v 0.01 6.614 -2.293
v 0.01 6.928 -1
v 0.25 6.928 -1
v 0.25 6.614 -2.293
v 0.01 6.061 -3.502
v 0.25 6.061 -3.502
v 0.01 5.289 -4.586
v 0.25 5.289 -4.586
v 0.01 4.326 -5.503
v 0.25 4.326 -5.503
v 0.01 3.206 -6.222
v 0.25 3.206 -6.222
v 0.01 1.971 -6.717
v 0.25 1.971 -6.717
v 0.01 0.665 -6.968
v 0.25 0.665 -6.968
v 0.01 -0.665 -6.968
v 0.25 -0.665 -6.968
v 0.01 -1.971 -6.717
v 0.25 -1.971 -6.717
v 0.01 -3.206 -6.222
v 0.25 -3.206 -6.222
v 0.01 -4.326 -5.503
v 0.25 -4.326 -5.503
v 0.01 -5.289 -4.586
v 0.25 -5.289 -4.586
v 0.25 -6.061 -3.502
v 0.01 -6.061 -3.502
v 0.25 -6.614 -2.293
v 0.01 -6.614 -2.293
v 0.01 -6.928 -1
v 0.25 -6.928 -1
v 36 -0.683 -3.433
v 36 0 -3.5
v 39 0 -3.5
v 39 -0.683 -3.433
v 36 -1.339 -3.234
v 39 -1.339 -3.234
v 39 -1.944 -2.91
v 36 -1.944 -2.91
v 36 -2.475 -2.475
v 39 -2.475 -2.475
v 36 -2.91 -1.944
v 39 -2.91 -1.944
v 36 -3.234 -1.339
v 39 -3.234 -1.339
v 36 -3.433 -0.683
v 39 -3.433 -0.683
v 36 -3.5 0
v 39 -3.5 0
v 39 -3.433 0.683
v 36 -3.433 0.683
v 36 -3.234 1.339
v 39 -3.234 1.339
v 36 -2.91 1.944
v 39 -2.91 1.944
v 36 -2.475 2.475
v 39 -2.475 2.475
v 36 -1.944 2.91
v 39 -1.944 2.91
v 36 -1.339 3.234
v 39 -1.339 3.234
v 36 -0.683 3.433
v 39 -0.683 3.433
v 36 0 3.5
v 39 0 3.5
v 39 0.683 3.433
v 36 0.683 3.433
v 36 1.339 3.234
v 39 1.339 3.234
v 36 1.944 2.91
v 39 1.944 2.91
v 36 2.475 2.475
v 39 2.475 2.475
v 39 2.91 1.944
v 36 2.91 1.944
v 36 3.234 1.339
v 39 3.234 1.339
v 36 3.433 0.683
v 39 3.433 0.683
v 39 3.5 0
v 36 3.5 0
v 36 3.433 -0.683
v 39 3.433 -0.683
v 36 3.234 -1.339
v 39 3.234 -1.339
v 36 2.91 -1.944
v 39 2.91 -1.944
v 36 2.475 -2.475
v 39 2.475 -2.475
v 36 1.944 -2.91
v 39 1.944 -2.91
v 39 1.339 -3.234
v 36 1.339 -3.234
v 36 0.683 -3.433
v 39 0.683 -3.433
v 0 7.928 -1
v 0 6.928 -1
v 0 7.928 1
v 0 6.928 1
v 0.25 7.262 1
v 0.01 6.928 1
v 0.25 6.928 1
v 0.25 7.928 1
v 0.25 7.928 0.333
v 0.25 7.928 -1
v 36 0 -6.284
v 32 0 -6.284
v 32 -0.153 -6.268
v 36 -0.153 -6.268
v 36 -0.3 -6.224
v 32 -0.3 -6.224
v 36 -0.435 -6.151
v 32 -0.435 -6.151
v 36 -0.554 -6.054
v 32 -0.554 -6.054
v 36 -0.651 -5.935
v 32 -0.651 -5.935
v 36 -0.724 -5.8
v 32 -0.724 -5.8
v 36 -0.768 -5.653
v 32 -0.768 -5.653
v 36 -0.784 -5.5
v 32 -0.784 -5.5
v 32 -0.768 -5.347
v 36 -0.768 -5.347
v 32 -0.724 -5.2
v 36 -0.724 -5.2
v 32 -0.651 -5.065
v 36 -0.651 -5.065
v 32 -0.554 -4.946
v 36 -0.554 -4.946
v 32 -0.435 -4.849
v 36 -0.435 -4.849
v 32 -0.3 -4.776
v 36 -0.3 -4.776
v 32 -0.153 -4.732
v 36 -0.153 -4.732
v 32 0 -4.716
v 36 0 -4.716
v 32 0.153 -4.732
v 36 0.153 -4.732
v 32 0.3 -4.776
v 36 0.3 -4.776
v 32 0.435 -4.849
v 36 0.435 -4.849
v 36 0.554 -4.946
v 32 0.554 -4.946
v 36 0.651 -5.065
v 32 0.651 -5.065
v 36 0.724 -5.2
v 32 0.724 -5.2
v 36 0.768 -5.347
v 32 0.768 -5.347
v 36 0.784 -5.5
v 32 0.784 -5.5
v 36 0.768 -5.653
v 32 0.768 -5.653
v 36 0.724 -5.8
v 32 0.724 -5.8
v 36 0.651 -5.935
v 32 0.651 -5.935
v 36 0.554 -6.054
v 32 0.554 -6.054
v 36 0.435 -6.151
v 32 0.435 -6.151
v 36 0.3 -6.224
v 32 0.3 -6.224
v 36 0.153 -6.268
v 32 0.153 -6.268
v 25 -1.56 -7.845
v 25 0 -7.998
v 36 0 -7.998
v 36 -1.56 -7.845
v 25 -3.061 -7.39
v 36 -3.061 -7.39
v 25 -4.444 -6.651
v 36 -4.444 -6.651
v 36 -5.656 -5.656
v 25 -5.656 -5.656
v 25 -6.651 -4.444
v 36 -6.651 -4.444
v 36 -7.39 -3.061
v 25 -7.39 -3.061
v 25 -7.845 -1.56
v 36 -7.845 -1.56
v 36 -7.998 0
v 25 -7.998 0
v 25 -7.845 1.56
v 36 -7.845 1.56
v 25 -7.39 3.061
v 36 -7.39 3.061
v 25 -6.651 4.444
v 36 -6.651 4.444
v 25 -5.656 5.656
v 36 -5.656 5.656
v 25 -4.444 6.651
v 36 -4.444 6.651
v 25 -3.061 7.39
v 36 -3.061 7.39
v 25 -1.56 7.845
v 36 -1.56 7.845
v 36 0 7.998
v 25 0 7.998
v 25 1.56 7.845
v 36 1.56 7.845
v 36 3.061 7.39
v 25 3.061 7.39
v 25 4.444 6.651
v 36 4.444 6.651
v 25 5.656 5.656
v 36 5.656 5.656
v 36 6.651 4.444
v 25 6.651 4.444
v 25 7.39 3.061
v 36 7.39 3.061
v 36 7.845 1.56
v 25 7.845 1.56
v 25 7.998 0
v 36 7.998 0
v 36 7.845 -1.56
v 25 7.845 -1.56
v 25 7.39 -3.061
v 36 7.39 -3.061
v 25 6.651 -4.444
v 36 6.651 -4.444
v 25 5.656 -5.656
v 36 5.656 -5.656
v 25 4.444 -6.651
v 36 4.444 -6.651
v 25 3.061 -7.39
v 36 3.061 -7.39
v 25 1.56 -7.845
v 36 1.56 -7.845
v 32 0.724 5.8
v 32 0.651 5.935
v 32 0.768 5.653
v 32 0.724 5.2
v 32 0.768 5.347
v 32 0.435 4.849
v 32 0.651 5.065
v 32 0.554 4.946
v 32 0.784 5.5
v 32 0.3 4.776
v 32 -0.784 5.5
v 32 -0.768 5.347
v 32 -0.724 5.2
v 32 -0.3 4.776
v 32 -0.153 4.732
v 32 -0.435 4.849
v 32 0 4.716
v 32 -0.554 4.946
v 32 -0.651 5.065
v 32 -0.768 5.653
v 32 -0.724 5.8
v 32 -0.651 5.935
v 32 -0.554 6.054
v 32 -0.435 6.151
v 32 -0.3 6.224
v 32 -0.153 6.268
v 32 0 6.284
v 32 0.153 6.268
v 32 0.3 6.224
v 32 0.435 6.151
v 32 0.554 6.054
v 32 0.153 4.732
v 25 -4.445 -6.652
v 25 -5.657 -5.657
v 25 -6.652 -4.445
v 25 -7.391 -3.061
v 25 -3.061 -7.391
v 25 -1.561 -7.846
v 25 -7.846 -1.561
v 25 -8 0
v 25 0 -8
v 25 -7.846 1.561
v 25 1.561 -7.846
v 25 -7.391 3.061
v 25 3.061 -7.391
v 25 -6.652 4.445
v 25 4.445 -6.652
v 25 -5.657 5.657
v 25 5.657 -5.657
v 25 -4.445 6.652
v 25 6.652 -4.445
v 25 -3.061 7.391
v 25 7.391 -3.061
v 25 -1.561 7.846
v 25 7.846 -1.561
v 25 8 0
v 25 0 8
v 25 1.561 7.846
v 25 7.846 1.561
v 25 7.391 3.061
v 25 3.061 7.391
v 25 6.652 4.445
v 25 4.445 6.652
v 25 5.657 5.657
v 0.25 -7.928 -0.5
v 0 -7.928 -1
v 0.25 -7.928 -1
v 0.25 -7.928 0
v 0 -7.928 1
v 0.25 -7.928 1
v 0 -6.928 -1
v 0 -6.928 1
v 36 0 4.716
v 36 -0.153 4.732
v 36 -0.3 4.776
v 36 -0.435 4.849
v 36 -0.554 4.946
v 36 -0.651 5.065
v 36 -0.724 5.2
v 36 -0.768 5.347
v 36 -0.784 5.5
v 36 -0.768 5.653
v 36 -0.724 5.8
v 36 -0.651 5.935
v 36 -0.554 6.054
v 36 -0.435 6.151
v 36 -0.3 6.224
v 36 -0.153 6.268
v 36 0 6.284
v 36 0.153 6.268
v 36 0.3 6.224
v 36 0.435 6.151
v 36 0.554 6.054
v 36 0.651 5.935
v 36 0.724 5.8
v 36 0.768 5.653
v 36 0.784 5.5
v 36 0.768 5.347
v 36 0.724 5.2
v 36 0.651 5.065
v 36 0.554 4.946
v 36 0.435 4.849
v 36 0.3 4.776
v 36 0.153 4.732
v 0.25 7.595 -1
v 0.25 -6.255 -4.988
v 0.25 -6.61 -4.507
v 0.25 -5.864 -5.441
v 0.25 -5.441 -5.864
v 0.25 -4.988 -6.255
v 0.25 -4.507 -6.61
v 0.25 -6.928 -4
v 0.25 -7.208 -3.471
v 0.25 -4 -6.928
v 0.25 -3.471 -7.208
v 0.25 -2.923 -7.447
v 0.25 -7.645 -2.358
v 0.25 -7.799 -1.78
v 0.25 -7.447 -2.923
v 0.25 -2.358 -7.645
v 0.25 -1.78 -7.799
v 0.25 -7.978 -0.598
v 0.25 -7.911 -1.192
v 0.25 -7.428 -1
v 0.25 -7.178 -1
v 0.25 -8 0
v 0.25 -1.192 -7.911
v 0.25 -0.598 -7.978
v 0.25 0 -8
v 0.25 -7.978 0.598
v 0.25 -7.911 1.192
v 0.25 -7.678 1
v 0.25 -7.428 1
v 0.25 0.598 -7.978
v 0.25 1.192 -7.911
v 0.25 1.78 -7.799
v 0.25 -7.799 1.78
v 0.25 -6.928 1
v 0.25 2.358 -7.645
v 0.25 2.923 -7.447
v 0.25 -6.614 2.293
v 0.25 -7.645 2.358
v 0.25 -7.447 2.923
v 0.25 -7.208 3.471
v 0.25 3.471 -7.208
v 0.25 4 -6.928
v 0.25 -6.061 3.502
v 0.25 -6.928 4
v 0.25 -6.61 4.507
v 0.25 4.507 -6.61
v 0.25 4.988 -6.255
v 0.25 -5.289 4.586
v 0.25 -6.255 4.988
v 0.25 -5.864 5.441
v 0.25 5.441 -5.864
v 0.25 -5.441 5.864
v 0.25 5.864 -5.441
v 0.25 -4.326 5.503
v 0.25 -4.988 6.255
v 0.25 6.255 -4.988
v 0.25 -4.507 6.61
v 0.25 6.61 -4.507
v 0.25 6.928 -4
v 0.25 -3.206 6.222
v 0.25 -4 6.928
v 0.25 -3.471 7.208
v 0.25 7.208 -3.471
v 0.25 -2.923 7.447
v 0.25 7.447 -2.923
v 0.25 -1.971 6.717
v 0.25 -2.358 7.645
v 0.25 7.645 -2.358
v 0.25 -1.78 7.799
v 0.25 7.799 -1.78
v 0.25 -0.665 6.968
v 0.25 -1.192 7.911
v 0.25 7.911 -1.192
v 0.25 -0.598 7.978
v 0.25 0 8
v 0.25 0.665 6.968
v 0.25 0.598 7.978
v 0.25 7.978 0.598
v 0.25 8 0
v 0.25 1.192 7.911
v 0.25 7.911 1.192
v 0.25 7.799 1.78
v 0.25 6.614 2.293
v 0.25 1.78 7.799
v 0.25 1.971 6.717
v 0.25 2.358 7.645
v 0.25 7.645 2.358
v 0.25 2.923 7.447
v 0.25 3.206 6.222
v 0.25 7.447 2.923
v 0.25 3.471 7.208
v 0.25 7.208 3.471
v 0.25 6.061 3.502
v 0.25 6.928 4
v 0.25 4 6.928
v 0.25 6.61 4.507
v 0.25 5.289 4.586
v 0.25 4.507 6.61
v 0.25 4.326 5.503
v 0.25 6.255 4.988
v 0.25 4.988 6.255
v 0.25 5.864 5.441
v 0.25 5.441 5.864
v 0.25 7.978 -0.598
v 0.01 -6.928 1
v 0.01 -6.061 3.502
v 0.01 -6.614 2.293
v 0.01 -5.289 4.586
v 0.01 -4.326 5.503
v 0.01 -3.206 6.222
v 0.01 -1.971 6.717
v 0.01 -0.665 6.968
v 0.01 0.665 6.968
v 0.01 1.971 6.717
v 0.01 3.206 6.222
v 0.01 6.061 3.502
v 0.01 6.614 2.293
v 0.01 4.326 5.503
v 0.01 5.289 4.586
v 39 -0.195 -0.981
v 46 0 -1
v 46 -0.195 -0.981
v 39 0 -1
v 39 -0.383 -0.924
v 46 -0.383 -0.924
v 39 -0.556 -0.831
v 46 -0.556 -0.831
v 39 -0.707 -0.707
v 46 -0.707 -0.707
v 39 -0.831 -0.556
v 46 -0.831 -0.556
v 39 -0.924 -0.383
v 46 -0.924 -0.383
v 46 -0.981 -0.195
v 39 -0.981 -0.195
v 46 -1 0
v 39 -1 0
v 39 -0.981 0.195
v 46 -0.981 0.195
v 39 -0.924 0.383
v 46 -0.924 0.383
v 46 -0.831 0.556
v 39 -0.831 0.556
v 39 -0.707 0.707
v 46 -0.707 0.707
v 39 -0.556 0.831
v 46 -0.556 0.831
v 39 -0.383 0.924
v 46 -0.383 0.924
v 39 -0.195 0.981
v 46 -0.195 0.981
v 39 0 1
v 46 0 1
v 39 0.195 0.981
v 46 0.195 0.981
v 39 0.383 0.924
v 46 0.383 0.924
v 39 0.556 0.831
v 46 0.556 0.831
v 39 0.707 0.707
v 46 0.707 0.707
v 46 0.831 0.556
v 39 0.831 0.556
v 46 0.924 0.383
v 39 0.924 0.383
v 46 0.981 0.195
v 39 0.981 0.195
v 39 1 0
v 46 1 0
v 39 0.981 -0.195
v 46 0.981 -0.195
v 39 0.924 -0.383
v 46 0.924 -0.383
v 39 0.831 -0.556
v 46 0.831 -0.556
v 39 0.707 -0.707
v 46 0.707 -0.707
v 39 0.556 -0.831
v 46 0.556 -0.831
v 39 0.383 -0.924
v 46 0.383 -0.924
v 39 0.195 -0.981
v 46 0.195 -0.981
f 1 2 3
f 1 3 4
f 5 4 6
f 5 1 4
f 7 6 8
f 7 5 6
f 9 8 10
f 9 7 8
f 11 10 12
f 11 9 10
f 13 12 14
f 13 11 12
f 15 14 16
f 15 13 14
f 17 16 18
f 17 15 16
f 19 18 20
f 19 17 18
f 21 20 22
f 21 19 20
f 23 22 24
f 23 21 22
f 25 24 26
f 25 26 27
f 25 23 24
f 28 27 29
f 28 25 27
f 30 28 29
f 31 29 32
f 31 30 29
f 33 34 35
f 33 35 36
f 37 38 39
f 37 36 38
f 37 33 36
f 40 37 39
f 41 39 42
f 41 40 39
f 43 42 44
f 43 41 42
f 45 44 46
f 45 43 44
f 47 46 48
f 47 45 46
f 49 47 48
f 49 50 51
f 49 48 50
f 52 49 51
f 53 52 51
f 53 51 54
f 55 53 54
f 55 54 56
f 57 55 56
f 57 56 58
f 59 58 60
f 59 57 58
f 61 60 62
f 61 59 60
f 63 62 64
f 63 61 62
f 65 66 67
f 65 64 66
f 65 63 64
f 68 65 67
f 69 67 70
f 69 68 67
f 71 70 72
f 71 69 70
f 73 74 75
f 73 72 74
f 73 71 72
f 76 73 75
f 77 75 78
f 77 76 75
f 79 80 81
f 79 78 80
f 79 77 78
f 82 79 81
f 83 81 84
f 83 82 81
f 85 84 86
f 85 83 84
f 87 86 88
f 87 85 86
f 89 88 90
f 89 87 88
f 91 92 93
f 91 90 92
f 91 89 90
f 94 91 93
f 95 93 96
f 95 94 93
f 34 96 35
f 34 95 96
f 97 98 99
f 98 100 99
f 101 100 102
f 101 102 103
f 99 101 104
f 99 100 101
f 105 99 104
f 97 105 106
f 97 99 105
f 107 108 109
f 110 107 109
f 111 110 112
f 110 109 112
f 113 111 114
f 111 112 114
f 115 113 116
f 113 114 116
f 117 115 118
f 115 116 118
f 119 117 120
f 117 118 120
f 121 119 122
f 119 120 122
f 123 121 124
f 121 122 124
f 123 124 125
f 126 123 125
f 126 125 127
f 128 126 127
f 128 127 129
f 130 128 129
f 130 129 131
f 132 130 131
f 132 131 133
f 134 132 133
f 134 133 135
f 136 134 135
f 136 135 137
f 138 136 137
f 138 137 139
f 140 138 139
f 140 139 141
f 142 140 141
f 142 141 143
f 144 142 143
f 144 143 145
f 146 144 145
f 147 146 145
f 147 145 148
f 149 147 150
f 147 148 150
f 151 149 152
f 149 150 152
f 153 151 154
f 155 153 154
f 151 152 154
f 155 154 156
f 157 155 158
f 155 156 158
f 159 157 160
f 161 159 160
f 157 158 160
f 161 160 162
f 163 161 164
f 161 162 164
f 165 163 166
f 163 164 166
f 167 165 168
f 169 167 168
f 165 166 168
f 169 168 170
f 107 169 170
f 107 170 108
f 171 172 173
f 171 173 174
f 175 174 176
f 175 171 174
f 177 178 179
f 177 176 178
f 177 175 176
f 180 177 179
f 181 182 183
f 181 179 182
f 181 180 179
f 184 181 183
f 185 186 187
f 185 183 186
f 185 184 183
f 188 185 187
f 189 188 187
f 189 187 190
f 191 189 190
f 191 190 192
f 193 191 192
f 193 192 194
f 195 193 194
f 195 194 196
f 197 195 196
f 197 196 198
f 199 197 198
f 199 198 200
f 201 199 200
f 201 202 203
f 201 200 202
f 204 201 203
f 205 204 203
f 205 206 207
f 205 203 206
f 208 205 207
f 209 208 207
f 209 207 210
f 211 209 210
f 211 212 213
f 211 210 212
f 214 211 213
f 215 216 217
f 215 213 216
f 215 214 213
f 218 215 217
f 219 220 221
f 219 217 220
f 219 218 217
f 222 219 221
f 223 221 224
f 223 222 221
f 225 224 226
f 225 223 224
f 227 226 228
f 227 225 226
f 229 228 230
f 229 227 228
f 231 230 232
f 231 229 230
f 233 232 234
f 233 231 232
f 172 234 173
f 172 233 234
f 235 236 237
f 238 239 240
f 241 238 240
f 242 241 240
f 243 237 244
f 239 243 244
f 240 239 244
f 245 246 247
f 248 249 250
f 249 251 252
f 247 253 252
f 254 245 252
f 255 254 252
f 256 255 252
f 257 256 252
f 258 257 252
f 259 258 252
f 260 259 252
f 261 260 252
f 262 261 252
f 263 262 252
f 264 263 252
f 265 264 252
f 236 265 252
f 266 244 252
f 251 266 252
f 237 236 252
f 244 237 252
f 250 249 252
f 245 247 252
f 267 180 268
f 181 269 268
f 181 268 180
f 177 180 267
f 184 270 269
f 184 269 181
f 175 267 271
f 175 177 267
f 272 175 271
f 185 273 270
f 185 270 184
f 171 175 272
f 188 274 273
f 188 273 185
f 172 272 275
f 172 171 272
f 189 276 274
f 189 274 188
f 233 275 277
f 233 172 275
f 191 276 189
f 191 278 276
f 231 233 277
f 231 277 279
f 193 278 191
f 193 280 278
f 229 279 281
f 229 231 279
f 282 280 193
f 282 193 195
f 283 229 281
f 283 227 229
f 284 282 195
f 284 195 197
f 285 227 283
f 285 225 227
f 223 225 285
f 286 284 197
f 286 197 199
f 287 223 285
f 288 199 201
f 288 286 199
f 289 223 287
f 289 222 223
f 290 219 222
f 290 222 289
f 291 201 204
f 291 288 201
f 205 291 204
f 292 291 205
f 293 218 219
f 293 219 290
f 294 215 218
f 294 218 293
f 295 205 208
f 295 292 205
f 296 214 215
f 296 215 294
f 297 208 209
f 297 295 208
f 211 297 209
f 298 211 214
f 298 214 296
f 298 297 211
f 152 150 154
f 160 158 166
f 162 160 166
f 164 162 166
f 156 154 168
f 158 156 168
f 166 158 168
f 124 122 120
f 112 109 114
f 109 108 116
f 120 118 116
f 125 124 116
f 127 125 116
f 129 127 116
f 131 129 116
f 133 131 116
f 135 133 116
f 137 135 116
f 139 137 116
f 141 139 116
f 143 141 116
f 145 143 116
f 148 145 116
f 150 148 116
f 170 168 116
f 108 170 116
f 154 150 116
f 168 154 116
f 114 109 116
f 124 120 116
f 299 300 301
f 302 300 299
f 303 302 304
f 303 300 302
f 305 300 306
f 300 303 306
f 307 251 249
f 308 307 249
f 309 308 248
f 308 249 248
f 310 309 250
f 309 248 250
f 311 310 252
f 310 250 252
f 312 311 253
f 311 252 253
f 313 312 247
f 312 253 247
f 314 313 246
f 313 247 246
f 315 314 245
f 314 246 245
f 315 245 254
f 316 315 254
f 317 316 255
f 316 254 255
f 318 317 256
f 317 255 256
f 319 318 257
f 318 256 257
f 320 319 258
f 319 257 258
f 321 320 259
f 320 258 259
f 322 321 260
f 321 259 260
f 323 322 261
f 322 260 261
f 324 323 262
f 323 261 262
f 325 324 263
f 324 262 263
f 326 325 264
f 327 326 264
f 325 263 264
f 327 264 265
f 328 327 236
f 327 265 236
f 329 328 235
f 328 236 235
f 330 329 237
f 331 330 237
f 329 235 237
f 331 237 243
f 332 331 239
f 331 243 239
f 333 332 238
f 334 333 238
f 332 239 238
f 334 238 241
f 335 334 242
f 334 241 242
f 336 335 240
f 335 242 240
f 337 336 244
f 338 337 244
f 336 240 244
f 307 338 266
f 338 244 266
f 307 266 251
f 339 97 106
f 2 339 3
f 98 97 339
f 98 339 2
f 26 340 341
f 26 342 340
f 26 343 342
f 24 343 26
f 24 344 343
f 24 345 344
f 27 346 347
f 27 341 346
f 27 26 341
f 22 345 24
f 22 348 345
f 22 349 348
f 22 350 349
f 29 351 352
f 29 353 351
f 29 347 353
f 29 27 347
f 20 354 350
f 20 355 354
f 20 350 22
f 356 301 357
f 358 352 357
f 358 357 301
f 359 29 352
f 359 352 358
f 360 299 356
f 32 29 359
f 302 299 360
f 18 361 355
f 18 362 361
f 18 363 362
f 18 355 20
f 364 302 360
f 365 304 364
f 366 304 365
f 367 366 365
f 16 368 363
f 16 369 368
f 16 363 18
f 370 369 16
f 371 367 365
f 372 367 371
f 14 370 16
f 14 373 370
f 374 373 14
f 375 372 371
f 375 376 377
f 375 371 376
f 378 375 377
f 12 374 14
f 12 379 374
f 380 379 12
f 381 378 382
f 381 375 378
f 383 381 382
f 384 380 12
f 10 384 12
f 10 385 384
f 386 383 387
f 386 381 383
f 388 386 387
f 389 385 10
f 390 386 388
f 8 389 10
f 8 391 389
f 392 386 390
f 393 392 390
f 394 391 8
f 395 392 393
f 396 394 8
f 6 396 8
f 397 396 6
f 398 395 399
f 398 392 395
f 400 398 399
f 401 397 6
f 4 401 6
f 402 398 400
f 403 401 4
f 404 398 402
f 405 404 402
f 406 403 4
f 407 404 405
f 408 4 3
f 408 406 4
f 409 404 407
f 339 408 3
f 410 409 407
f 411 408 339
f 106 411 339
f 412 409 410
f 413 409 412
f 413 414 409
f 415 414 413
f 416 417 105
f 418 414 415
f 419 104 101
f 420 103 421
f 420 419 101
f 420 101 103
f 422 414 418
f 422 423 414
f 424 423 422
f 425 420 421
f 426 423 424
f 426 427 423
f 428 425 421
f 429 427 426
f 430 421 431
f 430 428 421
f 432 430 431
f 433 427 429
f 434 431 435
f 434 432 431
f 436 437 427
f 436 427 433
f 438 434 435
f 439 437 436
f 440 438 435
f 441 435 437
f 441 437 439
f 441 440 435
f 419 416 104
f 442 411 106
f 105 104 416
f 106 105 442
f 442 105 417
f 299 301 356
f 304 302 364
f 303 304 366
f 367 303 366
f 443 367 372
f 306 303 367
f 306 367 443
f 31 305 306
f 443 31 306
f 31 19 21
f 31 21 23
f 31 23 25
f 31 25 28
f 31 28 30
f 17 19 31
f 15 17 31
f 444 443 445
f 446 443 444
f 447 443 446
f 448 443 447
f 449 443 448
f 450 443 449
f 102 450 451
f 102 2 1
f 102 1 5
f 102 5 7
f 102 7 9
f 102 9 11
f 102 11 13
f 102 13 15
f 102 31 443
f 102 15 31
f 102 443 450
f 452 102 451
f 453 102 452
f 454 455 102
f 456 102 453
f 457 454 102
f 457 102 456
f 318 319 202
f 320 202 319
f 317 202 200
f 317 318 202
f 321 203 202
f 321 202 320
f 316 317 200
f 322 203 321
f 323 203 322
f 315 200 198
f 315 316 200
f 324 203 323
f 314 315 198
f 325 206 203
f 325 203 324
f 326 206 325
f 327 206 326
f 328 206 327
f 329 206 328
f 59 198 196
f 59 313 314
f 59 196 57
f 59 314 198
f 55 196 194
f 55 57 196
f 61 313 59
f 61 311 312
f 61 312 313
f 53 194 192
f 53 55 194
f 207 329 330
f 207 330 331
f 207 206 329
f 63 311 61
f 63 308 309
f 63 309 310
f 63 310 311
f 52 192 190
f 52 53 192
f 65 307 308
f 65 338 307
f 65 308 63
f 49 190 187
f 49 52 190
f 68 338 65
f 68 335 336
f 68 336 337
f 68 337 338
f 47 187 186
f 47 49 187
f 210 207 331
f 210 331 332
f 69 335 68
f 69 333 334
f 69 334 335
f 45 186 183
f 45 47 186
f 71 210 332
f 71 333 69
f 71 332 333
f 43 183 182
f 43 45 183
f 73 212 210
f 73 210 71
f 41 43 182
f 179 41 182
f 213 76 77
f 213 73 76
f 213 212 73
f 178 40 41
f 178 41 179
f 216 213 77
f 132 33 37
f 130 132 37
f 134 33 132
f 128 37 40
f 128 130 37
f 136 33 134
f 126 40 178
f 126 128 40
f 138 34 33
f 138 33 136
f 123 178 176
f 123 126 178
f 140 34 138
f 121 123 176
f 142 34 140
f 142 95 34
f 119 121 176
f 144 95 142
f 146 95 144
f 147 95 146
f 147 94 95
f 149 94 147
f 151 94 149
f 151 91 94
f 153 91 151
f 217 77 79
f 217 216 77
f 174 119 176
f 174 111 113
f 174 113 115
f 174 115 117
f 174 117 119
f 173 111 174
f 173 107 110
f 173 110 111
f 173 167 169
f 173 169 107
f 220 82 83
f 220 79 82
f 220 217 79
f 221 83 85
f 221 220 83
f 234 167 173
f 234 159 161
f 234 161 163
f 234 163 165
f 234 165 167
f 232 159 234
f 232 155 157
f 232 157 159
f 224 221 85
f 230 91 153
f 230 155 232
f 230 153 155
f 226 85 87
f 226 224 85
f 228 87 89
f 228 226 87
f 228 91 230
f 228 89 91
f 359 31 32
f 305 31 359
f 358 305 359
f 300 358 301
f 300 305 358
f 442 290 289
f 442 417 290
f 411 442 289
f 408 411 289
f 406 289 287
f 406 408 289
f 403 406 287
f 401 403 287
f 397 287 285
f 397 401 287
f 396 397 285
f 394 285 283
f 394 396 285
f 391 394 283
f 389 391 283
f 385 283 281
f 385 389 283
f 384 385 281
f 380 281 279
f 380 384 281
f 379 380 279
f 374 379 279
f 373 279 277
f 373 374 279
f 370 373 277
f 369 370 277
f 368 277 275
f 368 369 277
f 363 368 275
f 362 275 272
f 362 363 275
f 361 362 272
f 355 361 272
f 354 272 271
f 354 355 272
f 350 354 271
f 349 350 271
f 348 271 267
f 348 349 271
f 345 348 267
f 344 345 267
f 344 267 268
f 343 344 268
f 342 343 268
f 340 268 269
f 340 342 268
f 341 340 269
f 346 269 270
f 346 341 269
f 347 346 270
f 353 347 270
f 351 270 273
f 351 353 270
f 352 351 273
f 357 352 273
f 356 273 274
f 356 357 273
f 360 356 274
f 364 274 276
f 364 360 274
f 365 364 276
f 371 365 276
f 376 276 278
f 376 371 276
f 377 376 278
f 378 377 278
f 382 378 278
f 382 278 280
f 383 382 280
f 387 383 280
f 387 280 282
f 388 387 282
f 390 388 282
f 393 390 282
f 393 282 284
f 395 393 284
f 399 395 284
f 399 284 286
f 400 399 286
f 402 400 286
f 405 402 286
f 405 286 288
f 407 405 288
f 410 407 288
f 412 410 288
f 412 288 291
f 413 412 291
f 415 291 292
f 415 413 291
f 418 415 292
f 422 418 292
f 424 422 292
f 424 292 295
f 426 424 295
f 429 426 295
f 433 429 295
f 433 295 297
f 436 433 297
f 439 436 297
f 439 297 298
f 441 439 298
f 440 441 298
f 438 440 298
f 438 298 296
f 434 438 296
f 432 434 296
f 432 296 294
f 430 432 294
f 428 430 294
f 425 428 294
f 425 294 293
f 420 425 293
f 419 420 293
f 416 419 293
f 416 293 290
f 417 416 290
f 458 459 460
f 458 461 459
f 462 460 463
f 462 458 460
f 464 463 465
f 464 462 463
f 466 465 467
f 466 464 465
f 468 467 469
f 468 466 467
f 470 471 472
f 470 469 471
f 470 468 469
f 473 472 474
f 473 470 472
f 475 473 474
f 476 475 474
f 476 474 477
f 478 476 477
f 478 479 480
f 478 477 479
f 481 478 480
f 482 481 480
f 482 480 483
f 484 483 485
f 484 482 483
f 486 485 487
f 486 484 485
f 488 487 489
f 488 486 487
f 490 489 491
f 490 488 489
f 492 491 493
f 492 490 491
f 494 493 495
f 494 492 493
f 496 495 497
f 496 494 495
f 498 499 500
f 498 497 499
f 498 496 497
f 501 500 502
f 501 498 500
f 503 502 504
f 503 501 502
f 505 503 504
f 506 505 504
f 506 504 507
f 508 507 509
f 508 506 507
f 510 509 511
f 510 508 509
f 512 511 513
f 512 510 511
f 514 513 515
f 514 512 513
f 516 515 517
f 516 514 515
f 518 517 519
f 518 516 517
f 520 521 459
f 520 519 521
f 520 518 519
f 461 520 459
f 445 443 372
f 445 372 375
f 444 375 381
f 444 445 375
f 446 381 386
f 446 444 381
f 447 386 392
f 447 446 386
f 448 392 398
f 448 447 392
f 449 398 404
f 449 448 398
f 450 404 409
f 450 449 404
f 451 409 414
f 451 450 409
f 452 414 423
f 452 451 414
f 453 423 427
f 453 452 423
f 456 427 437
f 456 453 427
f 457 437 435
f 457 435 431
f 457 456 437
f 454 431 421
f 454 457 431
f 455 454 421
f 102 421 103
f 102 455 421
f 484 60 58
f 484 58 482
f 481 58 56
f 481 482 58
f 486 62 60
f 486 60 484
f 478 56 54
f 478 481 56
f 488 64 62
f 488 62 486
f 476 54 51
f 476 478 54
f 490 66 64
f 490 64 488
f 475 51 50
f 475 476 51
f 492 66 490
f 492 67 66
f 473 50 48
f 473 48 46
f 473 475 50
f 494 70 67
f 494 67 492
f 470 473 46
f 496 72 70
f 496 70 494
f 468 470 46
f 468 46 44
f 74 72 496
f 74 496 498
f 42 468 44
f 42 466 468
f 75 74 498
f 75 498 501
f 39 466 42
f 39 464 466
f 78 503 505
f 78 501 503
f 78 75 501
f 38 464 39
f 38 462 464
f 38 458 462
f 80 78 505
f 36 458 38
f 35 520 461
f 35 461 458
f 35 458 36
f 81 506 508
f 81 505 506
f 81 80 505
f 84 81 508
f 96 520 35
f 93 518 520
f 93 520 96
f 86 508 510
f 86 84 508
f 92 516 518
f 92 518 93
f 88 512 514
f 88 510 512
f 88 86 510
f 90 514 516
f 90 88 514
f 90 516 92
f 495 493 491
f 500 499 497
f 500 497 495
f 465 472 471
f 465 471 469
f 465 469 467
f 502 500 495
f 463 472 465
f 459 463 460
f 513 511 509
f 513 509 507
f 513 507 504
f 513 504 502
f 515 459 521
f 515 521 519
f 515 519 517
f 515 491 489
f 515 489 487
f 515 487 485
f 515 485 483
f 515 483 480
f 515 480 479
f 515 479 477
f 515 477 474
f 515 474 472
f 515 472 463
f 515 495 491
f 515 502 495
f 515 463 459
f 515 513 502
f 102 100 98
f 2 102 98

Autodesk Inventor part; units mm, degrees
ref_plane "YZ Plane" through (0, 0, 0) normal (1, 0, 0) x (0, 1, 0)
ref_plane "XZ Plane" through (0, 0, 0) normal (0, 1, 0) x (-1, 0, 0)
ref_plane "XY Plane" through (0, 0, 0) normal (0, 0, 1) x (1, 0, 0)
sketch "Sketch1" plane through (0, 0, 0) normal (1, 0, 0) x (0, 1, 0)
  circle A0 centre (0, 0) radius 8
  dimension "d0" = 16
sketch "Sketch1 outline for Extrusion1" plane through (0, 0, 0) normal (1, 0, 0) x (0, 1, 0)
  circle A0 centre (0, 0) radius 8
extrude "Extrusion1" add sketch "Sketch1 outline for Extrusion1" along normal blind 25
sketch "Sketch2" plane through (25, 0, 0) normal (1, 0, 0) x (0, 0, -1)
  circle A0 centre (0, 0) radius 8 projected
  circle A1 centre (0, 0) radius 7.9985
  dimension "d20" = 15.997
sketch "Sketch2 outline for Extrusion2" plane through (25, 0, 0) normal (1, 0, 0) x (0, 0, -1)
  circle A0 centre (0, 0) radius 7.9985
extrude "Extrusion2" add sketch "Sketch2 outline for Extrusion2" along normal blind 11
sketch "Sketch3" plane through (36, 0, 0) normal (1, 0, 0) x (0, 0, -1)
  circle A0 centre (0, 0) radius 8 construction
  line L0 (-8, 0) -> (8, 0) construction
  circle A1 centre (0, 0) radius 5.5 construction
  point P0 (-5.5, 0)
  point P1 (5.5, 0)
  dimension "d6" = 11
hole "Hole1" at (36, 0, 5.5) at (36, 0, -5.5) direction (-1, 0, 0) diameter 1.567 depth 4 thread size "M2x0.4" class "6H" standard "ANSI Metric M Profile"
sketch "Sketch4" plane through (36, 0, 0) normal (1, 0, 0) x (0, 0, -1)
  circle A0 centre (-5.5, 0) radius 0.7835 projected
  circle A1 centre (5.5, 0) radius 0.7835 projected
  circle A2 centre (0, 0) radius 3.5
  dimension "d14" = 7
sketch "Sketch4 outline for Extrusion3" plane through (36, 0, 0) normal (1, 0, 0) x (0, 0, -1)
  circle A0 centre (0, 0) radius 3.5
extrude "Extrusion3" add sketch "Sketch4 outline for Extrusion3" along normal blind 3
sketch "Sketch5" plane through (39, 0, 0) normal (1, 0, 0) x (0, 0, -1)
  circle A0 centre (0, 0) radius 1
  dimension "d17" = 2
sketch "Sketch5 outline for Extrusion4" plane through (39, 0, 0) normal (1, 0, 0) x (0, 0, -1)
  circle A0 centre (0, 0) radius 1
extrude "Extrusion4" add sketch "Sketch5 outline for Extrusion4" along normal blind 7
sketch "Sketch6" plane through (0, 0, 0) normal (-1, 0, 0) x (0, 0, 1)
  circle A0 centre (0, 0) radius 7
  circle A1 centre (0, 0) radius 8
  line L0 (1, 6.928203) -> (-1, 6.928203)
  line L1 (-1, 6.928203) -> (-1, 7.928203)
  line L2 (-1, 7.928203) -> (1, 7.928203)
  line L3 (1, 7.928203) -> (1, 6.928203)
  line L4 (1, -6.928203) -> (-1, -6.928203)
  line L5 (-1, -6.928203) -> (-1, -7.928203)
  line L6 (-1, -7.928203) -> (1, -7.928203)
  line L7 (1, -7.928203) -> (1, -6.928203)
  dimension "d21" = 1
  dimension "d22" = 2
  dimension "d23" = 1
sketch "Sketch6 outline for Extrusion5" plane through (0, 0, 0) normal (-1, 0, 0) x (0, 0, 1)
  circle A0 centre (0, 0) radius 8
  arc A1 (-1, 6.928203) -> (-1, -6.928203) centre (0, 0) ccw
  line L0 (-1, -6.928203) -> (-1, -7.928203)
  line L1 (-1, -7.928203) -> (1, -7.928203)
  line L2 (1, -7.928203) -> (1, -6.928203)
  arc A2 (1, -6.928203) -> (1, 6.928203) centre (0, 0) ccw
  line L3 (1, 6.928203) -> (1, 7.928203)
  line L4 (1, 7.928203) -> (-1, 7.928203)
  line L5 (-1, 7.928203) -> (-1, 6.928203)
extrude "Extrusion5" cut sketch "Sketch6 outline for Extrusion5" against normal blind 0.25
sketch "Sketch6 outline for Extrusion6" plane through (0, 0, 0) normal (-1, 0, 0) x (0, 0, 1)
  arc A0 (1, -6.928203) -> (1, 6.928203) centre (0, 0) ccw
  line L0 (-1, -6.928203) -> (1, -6.928203)
  arc A1 (-1, 6.928203) -> (-1, -6.928203) centre (0, 0) ccw
  line L1 (1, 6.928203) -> (-1, 6.928203)
extrude "Extrusion6" cut sketch "Sketch6 outline for Extrusion6" against normal blind 0.01
properties part number "MotorNM" material "Steel, Galvanized"
